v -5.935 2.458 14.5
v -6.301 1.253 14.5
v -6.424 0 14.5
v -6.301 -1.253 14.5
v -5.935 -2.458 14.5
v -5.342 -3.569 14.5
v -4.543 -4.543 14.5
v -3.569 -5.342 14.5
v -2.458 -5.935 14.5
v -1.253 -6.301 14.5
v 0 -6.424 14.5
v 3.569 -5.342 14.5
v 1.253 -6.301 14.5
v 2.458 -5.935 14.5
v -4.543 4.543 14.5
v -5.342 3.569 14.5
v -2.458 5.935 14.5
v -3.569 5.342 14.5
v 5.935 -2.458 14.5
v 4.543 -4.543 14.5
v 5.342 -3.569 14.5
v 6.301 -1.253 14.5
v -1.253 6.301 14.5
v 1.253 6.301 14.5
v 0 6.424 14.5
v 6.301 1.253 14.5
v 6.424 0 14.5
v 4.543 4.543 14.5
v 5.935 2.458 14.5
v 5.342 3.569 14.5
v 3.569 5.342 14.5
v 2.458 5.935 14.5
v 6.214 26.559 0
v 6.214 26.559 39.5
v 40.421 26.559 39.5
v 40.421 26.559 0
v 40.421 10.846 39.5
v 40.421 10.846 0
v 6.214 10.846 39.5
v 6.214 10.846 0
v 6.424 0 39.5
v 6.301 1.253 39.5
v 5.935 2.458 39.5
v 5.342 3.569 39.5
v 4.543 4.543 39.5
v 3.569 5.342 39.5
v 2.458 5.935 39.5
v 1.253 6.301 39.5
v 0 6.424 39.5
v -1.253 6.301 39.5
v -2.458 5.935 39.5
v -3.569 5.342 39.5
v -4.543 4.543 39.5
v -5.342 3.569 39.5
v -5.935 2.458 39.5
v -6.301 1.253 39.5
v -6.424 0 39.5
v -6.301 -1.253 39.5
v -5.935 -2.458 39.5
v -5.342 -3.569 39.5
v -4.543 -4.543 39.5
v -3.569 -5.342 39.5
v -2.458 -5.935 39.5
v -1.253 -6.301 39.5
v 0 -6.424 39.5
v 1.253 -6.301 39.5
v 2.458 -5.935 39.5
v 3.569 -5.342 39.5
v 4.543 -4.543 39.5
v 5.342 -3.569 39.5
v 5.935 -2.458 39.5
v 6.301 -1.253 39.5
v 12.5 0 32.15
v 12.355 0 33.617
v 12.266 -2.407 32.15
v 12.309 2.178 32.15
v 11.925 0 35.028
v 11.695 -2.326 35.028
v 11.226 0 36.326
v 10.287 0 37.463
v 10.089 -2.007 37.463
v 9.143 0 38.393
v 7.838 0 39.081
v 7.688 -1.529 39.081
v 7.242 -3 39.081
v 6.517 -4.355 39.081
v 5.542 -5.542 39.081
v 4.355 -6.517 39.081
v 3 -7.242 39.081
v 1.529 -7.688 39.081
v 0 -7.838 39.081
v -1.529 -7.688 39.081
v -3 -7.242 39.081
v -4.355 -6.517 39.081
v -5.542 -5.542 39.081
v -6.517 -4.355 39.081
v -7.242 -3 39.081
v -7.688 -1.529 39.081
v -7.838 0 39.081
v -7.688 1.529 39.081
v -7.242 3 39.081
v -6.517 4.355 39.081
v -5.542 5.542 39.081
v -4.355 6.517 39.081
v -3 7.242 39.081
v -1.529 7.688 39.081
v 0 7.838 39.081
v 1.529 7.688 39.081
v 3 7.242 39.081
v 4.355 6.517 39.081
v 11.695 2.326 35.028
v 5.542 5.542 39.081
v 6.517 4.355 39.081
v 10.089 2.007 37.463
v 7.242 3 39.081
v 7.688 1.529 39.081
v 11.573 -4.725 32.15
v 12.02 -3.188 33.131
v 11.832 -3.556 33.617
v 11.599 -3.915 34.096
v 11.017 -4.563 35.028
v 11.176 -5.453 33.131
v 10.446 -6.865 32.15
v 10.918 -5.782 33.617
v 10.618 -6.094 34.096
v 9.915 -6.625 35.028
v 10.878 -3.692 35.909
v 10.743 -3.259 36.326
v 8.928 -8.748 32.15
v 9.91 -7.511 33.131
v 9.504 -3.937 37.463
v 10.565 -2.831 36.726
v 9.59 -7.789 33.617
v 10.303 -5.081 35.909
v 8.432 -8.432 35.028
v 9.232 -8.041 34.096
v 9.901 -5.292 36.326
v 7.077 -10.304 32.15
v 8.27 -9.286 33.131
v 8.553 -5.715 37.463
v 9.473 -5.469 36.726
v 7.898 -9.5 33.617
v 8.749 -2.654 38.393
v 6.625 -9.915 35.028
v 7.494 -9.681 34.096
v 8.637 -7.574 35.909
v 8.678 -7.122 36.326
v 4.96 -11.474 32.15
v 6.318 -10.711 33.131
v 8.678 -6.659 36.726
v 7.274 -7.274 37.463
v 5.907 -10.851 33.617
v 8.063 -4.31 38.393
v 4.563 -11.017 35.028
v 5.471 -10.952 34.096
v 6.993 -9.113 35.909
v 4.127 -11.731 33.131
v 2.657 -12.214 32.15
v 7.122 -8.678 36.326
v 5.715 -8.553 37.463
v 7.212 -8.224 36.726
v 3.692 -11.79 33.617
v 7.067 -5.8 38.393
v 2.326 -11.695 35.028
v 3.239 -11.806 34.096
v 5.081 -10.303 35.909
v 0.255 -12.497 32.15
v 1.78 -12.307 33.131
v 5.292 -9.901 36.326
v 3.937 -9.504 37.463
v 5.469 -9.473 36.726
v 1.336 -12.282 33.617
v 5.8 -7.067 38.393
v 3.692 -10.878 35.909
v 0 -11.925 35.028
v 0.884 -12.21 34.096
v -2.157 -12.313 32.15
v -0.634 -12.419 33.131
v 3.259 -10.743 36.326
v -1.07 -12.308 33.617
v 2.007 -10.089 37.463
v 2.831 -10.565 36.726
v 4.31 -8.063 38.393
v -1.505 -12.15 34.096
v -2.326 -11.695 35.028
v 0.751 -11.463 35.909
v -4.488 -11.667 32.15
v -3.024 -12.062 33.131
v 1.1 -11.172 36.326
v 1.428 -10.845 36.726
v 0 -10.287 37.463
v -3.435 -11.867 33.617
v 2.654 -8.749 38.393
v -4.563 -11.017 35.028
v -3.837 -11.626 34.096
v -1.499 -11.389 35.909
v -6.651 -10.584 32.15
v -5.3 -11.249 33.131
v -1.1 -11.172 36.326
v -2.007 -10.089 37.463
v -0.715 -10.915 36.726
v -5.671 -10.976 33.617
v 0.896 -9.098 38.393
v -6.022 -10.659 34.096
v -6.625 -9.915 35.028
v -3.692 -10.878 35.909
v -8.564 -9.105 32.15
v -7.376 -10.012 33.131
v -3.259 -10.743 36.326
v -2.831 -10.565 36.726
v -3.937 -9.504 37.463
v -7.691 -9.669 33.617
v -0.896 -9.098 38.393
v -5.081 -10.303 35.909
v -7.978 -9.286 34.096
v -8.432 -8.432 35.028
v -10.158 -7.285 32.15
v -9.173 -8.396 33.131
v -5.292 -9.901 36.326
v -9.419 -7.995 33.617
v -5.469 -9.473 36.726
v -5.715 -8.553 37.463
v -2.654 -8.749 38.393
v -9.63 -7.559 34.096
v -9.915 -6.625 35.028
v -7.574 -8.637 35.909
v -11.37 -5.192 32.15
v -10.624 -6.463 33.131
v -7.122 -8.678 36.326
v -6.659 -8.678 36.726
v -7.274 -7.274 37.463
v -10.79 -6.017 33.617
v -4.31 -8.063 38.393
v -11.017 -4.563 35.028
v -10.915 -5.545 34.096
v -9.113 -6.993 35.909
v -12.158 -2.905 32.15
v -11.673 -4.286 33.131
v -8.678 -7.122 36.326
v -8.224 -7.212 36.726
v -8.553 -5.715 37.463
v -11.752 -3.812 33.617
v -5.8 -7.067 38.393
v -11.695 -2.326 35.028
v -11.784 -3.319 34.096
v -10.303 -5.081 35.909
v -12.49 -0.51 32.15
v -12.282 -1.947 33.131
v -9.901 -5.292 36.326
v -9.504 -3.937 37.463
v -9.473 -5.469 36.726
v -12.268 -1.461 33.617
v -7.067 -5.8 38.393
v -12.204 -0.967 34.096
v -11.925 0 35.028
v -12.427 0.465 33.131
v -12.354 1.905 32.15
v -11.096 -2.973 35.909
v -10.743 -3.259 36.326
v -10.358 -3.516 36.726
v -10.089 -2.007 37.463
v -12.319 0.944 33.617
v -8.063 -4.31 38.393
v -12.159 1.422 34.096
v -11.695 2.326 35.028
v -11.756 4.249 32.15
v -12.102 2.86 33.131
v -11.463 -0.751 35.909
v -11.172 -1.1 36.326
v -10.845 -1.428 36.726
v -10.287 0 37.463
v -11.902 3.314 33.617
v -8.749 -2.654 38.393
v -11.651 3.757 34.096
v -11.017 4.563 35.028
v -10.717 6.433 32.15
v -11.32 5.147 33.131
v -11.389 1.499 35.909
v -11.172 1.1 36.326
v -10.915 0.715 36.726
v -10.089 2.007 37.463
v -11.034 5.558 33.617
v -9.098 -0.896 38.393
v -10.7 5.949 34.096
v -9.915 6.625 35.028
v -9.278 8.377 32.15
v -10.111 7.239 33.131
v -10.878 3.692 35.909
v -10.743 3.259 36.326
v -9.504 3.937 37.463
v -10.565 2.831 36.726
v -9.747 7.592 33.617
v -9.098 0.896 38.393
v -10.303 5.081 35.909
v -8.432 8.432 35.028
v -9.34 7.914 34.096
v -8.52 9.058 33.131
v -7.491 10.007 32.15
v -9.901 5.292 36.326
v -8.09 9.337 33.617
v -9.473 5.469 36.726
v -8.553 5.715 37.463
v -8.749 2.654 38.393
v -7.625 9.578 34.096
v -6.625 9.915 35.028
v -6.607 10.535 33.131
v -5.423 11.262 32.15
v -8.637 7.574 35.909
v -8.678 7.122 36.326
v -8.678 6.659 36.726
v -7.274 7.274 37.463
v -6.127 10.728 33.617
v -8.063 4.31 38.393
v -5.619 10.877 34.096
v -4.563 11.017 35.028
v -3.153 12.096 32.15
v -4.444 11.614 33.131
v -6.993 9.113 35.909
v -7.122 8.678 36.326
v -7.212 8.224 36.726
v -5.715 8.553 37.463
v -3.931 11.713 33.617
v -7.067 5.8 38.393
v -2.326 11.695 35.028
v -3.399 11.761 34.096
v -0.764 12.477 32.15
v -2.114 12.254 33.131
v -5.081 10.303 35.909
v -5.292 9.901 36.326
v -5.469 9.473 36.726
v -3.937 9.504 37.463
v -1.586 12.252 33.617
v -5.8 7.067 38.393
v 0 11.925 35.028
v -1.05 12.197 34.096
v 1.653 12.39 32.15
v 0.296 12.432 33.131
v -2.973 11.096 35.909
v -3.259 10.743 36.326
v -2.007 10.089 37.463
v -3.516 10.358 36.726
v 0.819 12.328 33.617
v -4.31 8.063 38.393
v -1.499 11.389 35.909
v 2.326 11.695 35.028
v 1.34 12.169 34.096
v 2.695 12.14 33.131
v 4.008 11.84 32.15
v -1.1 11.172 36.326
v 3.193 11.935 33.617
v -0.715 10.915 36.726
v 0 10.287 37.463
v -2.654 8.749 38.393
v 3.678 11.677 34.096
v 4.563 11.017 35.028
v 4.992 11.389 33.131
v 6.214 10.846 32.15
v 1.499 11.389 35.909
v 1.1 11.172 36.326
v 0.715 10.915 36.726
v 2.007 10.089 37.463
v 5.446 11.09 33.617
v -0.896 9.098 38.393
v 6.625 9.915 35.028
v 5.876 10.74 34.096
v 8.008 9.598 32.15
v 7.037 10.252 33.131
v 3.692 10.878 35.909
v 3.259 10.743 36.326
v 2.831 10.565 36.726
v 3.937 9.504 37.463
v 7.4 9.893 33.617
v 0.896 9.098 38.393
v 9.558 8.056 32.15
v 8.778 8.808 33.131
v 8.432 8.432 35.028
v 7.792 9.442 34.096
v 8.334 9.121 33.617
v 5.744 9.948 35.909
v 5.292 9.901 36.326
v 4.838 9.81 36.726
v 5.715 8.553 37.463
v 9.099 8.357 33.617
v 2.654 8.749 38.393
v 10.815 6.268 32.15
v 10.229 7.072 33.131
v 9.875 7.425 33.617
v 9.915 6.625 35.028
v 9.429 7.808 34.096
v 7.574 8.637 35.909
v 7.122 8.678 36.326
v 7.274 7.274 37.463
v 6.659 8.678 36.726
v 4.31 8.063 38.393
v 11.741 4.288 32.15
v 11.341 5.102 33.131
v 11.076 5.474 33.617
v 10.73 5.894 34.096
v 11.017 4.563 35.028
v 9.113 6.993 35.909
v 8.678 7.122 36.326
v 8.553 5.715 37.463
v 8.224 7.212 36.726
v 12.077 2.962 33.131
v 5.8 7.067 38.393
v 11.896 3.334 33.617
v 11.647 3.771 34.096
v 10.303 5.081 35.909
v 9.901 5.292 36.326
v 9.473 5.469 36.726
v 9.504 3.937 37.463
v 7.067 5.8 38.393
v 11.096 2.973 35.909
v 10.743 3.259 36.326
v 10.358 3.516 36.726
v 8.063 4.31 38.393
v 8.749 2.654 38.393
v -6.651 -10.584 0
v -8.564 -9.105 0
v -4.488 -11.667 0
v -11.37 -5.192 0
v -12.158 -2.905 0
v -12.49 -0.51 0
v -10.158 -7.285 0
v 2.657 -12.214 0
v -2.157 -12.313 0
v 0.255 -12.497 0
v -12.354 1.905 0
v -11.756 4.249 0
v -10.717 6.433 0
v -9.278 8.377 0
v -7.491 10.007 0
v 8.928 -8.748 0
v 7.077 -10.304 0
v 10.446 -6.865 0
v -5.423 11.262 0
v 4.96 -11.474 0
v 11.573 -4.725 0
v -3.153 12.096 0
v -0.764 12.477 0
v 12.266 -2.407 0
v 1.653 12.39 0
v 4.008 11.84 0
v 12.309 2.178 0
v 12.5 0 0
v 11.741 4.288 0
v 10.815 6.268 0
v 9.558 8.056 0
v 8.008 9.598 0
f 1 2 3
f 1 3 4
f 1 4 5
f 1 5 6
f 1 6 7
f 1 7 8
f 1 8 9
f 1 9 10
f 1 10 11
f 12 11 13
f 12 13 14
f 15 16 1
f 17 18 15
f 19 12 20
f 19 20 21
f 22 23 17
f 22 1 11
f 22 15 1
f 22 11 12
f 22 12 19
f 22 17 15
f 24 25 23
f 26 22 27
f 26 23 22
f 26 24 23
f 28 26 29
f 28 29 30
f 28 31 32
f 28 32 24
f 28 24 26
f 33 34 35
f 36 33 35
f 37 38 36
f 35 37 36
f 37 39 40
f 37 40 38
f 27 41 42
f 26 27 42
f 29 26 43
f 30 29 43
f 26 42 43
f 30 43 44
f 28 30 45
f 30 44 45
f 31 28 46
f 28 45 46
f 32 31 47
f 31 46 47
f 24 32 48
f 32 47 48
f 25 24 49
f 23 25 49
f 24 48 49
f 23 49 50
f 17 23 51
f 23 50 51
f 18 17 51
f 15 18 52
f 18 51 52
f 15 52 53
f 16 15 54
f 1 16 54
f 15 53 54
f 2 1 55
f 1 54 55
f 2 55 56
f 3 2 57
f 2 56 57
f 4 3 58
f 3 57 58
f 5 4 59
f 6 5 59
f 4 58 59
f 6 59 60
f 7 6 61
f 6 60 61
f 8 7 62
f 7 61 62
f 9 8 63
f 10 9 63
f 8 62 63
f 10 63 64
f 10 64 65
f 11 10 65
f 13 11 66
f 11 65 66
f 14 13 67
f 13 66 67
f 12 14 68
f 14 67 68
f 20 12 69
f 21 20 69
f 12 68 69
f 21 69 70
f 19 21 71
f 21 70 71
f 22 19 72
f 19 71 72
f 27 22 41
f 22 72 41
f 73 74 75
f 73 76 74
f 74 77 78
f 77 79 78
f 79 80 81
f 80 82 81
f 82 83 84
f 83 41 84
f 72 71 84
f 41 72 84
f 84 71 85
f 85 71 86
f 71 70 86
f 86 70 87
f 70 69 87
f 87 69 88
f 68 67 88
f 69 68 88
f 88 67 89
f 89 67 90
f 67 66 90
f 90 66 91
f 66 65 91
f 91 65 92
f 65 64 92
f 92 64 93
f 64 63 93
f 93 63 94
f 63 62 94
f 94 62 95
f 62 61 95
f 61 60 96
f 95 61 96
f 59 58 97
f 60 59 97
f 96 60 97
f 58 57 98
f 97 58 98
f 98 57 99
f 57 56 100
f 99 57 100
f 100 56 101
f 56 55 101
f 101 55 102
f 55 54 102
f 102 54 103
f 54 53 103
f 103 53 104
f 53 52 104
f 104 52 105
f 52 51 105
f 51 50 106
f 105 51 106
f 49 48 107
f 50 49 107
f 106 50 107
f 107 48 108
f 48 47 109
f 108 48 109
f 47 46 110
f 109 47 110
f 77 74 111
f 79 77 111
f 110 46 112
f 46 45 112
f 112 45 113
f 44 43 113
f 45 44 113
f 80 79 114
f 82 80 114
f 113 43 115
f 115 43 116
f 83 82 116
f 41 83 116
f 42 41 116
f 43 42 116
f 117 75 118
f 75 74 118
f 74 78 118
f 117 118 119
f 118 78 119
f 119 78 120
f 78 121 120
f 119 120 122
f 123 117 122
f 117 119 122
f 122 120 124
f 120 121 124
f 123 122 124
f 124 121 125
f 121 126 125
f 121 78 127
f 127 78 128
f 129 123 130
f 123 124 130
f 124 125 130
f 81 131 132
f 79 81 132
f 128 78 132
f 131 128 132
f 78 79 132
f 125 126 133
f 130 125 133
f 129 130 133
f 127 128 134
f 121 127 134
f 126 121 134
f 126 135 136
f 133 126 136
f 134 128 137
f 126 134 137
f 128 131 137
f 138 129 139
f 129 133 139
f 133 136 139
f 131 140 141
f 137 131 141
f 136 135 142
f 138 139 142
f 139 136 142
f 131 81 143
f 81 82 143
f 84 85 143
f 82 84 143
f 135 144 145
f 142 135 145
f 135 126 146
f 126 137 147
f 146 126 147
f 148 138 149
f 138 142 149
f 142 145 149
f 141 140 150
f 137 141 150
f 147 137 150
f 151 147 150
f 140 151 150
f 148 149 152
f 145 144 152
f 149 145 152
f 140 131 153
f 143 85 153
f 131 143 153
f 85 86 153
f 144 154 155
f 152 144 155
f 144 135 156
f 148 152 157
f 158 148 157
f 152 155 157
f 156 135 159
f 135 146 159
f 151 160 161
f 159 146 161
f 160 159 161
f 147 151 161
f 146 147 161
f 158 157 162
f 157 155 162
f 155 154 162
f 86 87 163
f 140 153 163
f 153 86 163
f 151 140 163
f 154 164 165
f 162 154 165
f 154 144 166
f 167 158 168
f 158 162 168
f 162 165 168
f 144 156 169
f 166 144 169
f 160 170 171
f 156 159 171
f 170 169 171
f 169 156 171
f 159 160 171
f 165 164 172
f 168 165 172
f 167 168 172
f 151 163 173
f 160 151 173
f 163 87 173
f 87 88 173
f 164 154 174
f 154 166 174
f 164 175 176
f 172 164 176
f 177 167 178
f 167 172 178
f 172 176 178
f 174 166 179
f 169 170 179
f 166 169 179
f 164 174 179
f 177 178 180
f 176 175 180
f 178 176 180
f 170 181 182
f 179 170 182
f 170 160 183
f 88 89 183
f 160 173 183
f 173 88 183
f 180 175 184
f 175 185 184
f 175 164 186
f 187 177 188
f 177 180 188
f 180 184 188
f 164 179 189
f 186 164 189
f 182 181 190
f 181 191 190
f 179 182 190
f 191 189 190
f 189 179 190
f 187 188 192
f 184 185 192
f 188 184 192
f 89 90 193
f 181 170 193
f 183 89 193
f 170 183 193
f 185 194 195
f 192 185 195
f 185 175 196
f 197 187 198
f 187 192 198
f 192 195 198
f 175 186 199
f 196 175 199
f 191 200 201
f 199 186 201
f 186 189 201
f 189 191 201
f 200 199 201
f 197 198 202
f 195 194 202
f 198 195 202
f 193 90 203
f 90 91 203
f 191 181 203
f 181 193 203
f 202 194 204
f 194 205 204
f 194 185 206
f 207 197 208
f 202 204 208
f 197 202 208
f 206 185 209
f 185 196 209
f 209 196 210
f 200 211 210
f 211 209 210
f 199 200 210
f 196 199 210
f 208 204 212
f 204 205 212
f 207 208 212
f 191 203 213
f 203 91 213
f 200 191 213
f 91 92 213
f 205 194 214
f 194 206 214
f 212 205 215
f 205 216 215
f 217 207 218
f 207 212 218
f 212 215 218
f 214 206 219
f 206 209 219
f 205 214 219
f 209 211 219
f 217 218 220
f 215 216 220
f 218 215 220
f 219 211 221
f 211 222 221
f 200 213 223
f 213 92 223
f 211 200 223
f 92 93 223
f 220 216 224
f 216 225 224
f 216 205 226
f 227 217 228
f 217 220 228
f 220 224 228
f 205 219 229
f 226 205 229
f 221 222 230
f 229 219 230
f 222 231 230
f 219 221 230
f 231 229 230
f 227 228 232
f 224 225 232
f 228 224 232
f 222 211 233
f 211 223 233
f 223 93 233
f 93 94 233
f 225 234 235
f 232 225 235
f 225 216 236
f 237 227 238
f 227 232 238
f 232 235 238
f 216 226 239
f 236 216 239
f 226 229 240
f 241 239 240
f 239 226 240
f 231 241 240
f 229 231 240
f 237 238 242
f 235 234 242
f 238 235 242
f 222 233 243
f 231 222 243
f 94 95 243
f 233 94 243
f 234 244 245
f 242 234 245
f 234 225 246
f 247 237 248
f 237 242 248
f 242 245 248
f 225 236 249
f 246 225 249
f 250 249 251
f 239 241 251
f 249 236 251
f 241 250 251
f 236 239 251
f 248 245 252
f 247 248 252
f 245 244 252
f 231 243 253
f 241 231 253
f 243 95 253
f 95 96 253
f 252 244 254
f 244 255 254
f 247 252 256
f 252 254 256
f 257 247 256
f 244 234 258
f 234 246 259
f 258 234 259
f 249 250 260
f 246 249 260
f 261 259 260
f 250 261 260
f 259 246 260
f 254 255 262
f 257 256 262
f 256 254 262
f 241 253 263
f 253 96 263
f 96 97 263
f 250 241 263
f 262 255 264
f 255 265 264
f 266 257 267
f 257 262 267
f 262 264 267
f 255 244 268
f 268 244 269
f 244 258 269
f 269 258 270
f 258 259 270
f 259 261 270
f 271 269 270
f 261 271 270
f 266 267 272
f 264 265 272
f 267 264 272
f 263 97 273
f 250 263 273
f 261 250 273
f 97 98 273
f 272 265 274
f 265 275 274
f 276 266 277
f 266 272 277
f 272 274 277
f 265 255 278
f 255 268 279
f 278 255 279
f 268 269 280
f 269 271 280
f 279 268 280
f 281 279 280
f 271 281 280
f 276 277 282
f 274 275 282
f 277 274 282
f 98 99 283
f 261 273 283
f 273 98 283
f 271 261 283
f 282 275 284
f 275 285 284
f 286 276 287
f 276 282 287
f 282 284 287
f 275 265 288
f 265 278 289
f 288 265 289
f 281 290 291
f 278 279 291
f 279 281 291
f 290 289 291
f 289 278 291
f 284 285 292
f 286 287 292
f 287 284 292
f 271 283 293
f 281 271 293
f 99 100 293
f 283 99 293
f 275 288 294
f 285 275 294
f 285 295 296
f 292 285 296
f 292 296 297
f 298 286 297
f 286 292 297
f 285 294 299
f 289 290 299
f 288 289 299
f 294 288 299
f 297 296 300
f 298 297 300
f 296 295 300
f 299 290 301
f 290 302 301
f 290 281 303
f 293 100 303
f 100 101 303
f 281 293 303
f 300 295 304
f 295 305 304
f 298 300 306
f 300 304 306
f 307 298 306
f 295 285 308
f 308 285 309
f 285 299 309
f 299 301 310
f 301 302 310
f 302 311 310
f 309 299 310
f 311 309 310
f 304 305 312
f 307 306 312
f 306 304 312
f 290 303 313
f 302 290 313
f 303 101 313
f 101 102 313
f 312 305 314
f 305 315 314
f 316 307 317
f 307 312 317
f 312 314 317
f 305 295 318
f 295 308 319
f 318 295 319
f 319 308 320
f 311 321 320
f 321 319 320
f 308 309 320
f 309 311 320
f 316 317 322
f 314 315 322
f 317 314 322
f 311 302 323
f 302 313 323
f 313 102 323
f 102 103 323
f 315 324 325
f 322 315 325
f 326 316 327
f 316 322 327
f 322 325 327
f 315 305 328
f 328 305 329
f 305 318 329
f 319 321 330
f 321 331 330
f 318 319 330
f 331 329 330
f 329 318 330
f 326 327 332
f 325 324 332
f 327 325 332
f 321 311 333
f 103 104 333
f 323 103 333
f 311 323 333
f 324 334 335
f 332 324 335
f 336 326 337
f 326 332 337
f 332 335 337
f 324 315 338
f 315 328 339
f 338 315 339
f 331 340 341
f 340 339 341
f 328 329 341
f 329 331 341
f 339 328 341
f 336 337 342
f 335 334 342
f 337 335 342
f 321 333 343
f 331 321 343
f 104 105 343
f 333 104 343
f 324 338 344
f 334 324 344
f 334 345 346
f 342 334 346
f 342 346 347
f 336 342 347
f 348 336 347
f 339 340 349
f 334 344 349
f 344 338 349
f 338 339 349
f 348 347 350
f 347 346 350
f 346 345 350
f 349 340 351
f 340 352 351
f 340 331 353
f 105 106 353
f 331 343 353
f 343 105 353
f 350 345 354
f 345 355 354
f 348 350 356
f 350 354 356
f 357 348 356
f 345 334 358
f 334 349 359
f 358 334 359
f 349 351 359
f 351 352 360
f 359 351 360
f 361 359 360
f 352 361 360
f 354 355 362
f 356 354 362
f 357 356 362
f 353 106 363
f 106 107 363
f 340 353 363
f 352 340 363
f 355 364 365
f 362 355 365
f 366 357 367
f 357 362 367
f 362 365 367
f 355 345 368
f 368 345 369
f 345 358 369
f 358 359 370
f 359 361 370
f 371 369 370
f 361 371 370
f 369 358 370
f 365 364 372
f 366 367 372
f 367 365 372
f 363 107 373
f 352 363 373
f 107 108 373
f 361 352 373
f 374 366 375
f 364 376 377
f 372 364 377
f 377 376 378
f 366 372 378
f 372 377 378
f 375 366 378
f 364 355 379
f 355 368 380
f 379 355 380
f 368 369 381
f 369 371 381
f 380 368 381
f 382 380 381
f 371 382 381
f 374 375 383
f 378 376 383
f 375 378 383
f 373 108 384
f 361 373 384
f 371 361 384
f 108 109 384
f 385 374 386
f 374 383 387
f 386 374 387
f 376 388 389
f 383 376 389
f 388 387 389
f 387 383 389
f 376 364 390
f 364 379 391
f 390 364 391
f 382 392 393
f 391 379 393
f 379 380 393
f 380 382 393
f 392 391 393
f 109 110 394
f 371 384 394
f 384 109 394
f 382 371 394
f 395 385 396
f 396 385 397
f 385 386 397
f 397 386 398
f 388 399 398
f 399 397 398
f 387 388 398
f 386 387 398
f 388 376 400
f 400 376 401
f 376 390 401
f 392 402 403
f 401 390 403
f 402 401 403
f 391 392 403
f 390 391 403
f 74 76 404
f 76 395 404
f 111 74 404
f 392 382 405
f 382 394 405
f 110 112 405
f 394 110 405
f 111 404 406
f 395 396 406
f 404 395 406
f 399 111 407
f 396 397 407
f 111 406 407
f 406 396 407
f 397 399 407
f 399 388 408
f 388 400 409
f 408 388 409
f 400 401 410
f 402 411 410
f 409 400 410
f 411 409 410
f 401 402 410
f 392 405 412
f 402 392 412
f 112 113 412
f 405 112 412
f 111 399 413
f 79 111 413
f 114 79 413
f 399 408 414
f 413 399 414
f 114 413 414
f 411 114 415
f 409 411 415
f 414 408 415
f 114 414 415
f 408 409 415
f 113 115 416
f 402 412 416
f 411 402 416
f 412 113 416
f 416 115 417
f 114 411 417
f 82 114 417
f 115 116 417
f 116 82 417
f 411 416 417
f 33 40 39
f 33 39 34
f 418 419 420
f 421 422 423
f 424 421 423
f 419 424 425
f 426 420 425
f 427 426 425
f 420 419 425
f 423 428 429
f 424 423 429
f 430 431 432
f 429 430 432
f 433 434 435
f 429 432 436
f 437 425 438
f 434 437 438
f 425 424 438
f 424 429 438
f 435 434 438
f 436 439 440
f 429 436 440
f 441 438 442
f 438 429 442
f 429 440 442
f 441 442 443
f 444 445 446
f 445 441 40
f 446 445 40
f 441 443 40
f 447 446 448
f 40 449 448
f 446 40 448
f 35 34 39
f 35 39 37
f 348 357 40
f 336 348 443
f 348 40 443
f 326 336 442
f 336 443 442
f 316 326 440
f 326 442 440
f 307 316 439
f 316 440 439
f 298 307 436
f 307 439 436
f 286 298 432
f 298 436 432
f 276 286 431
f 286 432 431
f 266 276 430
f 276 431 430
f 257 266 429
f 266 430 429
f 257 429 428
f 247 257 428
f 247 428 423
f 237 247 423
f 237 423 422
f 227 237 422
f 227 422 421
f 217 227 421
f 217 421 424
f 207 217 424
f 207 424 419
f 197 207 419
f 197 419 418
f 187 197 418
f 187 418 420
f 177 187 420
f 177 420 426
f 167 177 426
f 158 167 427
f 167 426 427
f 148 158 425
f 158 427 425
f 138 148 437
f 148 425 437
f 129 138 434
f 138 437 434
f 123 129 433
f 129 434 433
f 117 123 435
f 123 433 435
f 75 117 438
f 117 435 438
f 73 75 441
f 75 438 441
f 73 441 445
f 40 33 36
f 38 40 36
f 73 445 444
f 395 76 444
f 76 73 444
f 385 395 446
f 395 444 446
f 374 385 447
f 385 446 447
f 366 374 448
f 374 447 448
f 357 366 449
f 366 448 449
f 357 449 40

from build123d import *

# Parameters (mm, degrees)
F1_DEPTH = 39.5
F0_W     = 34.2074480574
F0_H     = 15.712268627
F2_R     = 6.4243054604
F3_DEPTH = 25


# Not quite as in the source:
# - a fillet or chamfer that OpenCascade refuses, or shapes differently, is made with other operations: its cross-section is extruded or revolved along the edge and cut away or added


with BuildPart() as f1:
    # F0 (on Top) → F1 (new body)
    with BuildSketch(Plane.XY):
        with BuildLine():
            ThreePointArc((6.2135610063, 10.8462739971), (-10.8147934002, -6.268193018), (12.5, 0))
            ThreePointArc((12.5, 0), (10.8147934002, 6.268193018), (6.2135610063, 10.8462739971))
        make_face()
    extrude(amount=F1_DEPTH)

    # F2 (on face) → F3 (cut)
    with BuildSketch(Plane.XY.offset(39.5)):
        Circle(F2_R)
    extrude(amount=-F3_DEPTH, mode=Mode.SUBTRACT)

    # F4: fillet of radius 7.4840620434 on 1 edges, made by hand

    # F4_s1 → F4_t2 (revolve, cut)
    with BuildSketch(Plane.XZ):
        with BuildLine():
            ThreePointArc((12.5, 32.1496472436), (10.7844513893, 36.9178164358), (6.4243054604, 39.5))
            Line((6.4243054604, 39.5), (12.5, 39.5))
            Line((12.5, 39.5), (12.5, 32.1496472436))
        make_face()
    revolve(axis=Axis((0, 0, 39.5), (0, 0, -1)), mode=Mode.SUBTRACT)


with BuildPart() as f1b:
    # F0 (on Top) → F1, piece 2 (new body)
    with BuildSketch(Plane.XY):
        with Locations((23.317285035, 18.7024083106)):
            Rectangle(F0_W, F0_H)
    extrude(amount=F1_DEPTH)


solid = Compound([f1.part, f1b.part])
